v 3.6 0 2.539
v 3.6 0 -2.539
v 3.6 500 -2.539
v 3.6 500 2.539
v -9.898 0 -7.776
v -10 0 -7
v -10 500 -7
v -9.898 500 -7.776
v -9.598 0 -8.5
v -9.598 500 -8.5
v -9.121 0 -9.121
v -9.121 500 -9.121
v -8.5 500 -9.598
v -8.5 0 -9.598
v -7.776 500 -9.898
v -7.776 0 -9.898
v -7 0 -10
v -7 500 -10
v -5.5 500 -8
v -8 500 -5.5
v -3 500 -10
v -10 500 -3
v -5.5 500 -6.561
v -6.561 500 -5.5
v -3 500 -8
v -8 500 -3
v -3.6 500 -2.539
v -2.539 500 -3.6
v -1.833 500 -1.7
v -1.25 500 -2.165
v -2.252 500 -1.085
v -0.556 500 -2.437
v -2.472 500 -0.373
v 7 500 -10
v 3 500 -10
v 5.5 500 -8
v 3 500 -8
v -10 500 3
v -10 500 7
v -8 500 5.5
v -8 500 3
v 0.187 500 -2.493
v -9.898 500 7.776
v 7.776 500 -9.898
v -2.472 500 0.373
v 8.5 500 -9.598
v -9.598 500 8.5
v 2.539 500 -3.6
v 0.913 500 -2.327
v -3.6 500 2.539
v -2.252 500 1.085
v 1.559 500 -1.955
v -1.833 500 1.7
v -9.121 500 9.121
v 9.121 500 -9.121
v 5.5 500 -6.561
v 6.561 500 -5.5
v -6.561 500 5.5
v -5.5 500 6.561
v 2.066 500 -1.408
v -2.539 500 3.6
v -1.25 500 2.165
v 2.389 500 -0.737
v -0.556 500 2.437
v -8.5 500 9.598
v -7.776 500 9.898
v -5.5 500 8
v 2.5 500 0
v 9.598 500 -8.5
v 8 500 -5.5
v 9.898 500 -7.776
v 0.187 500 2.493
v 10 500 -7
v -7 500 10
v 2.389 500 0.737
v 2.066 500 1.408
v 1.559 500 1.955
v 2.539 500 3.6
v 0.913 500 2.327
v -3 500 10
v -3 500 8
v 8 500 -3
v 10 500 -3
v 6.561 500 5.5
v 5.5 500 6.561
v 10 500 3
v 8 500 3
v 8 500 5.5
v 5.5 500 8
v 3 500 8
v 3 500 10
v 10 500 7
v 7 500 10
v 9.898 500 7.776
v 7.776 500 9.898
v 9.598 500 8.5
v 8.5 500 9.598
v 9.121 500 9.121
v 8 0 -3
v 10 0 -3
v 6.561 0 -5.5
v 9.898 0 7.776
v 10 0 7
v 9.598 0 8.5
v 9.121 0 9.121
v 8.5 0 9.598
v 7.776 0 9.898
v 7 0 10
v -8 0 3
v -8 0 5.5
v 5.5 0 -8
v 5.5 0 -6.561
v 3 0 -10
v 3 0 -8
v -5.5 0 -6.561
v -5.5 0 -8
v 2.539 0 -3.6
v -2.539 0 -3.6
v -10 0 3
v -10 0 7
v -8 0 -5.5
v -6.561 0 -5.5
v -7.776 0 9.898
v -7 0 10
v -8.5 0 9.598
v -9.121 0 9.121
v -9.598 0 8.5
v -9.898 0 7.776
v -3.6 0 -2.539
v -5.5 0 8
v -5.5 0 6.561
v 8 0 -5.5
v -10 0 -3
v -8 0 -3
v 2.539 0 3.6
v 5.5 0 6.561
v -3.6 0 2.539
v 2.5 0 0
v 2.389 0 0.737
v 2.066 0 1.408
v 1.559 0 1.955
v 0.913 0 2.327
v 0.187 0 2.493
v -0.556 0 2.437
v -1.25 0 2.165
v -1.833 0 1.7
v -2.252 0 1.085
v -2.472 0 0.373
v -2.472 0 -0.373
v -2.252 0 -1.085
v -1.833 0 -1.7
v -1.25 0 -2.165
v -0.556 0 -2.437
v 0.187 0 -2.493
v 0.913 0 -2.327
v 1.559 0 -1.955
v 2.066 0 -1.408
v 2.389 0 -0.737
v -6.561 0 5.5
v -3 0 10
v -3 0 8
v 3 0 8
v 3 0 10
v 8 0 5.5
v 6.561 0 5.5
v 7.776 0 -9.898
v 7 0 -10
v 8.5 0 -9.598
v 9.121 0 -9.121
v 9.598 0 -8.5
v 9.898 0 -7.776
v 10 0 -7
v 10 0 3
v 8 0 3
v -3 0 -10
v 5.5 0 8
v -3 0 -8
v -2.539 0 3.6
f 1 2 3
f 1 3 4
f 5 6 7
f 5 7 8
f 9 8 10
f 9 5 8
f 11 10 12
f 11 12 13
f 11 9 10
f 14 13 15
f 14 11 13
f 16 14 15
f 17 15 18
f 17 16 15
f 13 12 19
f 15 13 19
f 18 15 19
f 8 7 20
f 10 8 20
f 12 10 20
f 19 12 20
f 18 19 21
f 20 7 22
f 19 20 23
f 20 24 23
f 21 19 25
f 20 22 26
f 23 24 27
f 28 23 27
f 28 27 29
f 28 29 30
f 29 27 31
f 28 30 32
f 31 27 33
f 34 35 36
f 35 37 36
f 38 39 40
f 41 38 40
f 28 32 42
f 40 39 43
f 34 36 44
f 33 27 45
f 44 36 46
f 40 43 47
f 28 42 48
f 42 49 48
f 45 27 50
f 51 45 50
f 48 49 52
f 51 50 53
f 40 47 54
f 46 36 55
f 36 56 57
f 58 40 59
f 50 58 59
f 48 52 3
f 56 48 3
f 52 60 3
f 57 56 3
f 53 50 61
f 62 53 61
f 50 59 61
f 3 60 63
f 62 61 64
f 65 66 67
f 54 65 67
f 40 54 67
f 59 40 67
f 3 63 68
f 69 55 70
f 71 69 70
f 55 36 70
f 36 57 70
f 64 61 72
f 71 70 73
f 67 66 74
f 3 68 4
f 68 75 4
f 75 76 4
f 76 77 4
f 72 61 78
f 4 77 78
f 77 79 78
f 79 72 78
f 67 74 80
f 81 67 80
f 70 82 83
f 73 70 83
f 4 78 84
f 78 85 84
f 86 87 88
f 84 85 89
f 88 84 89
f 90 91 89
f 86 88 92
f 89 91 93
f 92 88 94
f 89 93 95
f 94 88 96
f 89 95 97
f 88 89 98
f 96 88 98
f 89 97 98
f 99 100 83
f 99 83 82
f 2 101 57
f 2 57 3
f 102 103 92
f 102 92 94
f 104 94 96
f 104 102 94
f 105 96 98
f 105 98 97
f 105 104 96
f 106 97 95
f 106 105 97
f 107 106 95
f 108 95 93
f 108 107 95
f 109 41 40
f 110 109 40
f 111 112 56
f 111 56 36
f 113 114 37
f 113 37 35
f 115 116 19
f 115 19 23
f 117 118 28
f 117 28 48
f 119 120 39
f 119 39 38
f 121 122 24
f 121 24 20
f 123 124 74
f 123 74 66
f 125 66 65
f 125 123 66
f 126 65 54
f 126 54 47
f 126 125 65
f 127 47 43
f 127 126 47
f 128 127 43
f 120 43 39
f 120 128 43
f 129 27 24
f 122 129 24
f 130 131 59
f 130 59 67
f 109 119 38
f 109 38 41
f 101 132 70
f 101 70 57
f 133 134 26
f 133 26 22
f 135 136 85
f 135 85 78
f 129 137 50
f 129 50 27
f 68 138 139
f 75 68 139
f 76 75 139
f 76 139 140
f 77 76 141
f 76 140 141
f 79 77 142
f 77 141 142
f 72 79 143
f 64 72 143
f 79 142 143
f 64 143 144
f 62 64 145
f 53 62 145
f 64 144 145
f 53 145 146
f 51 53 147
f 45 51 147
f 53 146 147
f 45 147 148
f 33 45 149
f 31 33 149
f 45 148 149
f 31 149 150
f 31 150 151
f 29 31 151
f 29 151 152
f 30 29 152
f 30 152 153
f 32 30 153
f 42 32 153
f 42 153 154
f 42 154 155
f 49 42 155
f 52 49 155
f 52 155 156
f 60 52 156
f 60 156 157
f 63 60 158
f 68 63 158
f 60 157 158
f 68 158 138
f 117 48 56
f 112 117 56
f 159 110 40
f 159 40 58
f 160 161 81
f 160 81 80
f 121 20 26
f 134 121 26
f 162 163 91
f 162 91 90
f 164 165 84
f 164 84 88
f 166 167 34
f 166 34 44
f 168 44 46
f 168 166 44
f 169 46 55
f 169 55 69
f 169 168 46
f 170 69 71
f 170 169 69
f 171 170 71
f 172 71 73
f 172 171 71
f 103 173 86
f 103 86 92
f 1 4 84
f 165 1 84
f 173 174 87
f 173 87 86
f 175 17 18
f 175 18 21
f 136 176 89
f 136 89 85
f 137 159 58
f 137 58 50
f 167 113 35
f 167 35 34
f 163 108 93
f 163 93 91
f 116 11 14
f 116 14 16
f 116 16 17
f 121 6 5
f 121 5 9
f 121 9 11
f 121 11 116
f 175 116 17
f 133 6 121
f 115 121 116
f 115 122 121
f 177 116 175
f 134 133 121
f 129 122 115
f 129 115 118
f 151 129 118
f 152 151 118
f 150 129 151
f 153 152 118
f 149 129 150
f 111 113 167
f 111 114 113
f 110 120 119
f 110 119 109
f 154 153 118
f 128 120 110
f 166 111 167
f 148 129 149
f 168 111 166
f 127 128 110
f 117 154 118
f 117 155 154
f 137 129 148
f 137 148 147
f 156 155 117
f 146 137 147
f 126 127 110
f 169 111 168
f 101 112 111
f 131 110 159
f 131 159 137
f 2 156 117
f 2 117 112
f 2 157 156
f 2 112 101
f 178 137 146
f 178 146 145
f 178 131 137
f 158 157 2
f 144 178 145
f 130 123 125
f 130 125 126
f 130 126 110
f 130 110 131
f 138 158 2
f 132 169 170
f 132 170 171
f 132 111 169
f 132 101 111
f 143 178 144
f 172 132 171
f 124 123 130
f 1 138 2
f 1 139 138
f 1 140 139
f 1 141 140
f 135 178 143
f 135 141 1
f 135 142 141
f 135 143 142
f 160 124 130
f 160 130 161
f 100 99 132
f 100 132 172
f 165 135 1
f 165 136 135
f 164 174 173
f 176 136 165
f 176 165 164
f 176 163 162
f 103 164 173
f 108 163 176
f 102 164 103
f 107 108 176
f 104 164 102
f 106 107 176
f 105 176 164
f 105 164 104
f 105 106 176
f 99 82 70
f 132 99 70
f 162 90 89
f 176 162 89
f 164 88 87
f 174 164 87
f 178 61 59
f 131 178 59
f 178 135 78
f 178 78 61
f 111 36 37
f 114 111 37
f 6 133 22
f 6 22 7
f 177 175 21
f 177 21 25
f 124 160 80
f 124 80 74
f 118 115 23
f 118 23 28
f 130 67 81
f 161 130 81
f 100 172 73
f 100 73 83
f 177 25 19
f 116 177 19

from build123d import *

# Parameters (mm, degrees)
F0_R     = 2.5
F1_DEPTH = 500


with BuildPart() as f1:
    # F0 (on Front) → F1 (new body)
    with BuildSketch(Plane.XZ):
        with BuildLine():
            Line((3, -10), (7, -10))
            ThreePointArc((7, -10), (9.12132, -9.12132), (10, -7))
            Line((10, -7), (10, -3))
            Line((10, -3), (8, -3))
            Line((8, -3), (8, -5.5))
            Line((8, -5.5), (8, -6.93934))
            Line((8, -6.93934), (6.56066, -5.5))
            Line((6.56066, -5.5), (3.6, -2.53934))
            Line((3.6, -2.53934), (3.6, 2.53934))
            Line((3.6, 2.53934), (6.56066, 5.5))
            Line((6.56066, 5.5), (8, 6.93934))
            Line((8, 6.93934), (8, 5.5))
            Line((8, 5.5), (8, 3))
            Line((8, 3), (10, 3))
            Line((10, 3), (10, 7))
            ThreePointArc((10, 7), (9.12132, 9.12132), (7, 10))
            Line((7, 10), (3, 10))
            Line((3, 10), (3, 8))
            Line((3, 8), (5.5, 8))
            Line((5.5, 8), (6.93934, 8))
            Line((6.93934, 8), (5.5, 6.56066))
            Line((5.5, 6.56066), (2.53934, 3.6))
            Line((2.53934, 3.6), (-2.53934, 3.6))
            Line((-2.53934, 3.6), (-5.5, 6.56066))
            Line((-5.5, 6.56066), (-6.93934, 8))
            Line((-6.93934, 8), (-5.5, 8))
            Line((-5.5, 8), (-3, 8))
            Line((-3, 8), (-3, 10))
            Line((-3, 10), (-7, 10))
            ThreePointArc((-7, 10), (-9.12132, 9.12132), (-10, 7))
            Line((-10, 7), (-10, 3))
            Line((-10, 3), (-8, 3))
            Line((-8, 3), (-8, 5.5))
            Line((-8, 5.5), (-8, 6.93934))
            Line((-8, 6.93934), (-6.56066, 5.5))
            Line((-6.56066, 5.5), (-3.6, 2.53934))
            Line((-3.6, 2.53934), (-3.6, -2.53934))
            Line((-3.6, -2.53934), (-6.56066, -5.5))
            Line((-6.56066, -5.5), (-8, -6.93934))
            Line((-8, -6.93934), (-8, -5.5))
            Line((-8, -5.5), (-8, -3))
            Line((-8, -3), (-10, -3))
            Line((-10, -3), (-10, -7))
            ThreePointArc((-10, -7), (-9.12132, -9.12132), (-7, -10))
            Line((-7, -10), (-3, -10))
            Line((-3, -10), (-3, -8))
            Line((-3, -8), (-5.5, -8))
            Line((-5.5, -8), (-6.93934, -8))
            Line((-6.93934, -8), (-5.5, -6.56066))
            Line((-5.5, -6.56066), (-2.53934, -3.6))
            Line((-2.53934, -3.6), (2.53934, -3.6))
            Line((2.53934, -3.6), (5.5, -6.56066))
            Line((5.5, -6.56066), (6.93934, -8))
            Line((6.93934, -8), (5.5, -8))
            Line((5.5, -8), (3, -8))
            Line((3, -8), (3, -10))
        make_face()
        Circle(F0_R, mode=Mode.SUBTRACT)
        Polygon((5.5, -6.56066), (5.5, -8), (6.93934, -8), align=None)
        Polygon((8, -6.93934), (8, -5.5), (6.56066, -5.5), align=None)
        Polygon((-5.5, -8), (-5.5, -6.56066), (-6.93934, -8), align=None)
        Polygon((8, 6.93934), (6.56066, 5.5), (8, 5.5), align=None)
        Polygon((-6.56066, -5.5), (-8, -5.5), (-8, -6.93934), align=None)
        Polygon((6.93934, 8), (5.5, 8), (5.5, 6.56066), align=None)
        Polygon((-8, 5.5), (-6.56066, 5.5), (-8, 6.93934), align=None)
        Polygon((-6.93934, 8), (-5.5, 6.56066), (-5.5, 8), align=None)
    extrude(amount=-F1_DEPTH)


solid = f1.part
